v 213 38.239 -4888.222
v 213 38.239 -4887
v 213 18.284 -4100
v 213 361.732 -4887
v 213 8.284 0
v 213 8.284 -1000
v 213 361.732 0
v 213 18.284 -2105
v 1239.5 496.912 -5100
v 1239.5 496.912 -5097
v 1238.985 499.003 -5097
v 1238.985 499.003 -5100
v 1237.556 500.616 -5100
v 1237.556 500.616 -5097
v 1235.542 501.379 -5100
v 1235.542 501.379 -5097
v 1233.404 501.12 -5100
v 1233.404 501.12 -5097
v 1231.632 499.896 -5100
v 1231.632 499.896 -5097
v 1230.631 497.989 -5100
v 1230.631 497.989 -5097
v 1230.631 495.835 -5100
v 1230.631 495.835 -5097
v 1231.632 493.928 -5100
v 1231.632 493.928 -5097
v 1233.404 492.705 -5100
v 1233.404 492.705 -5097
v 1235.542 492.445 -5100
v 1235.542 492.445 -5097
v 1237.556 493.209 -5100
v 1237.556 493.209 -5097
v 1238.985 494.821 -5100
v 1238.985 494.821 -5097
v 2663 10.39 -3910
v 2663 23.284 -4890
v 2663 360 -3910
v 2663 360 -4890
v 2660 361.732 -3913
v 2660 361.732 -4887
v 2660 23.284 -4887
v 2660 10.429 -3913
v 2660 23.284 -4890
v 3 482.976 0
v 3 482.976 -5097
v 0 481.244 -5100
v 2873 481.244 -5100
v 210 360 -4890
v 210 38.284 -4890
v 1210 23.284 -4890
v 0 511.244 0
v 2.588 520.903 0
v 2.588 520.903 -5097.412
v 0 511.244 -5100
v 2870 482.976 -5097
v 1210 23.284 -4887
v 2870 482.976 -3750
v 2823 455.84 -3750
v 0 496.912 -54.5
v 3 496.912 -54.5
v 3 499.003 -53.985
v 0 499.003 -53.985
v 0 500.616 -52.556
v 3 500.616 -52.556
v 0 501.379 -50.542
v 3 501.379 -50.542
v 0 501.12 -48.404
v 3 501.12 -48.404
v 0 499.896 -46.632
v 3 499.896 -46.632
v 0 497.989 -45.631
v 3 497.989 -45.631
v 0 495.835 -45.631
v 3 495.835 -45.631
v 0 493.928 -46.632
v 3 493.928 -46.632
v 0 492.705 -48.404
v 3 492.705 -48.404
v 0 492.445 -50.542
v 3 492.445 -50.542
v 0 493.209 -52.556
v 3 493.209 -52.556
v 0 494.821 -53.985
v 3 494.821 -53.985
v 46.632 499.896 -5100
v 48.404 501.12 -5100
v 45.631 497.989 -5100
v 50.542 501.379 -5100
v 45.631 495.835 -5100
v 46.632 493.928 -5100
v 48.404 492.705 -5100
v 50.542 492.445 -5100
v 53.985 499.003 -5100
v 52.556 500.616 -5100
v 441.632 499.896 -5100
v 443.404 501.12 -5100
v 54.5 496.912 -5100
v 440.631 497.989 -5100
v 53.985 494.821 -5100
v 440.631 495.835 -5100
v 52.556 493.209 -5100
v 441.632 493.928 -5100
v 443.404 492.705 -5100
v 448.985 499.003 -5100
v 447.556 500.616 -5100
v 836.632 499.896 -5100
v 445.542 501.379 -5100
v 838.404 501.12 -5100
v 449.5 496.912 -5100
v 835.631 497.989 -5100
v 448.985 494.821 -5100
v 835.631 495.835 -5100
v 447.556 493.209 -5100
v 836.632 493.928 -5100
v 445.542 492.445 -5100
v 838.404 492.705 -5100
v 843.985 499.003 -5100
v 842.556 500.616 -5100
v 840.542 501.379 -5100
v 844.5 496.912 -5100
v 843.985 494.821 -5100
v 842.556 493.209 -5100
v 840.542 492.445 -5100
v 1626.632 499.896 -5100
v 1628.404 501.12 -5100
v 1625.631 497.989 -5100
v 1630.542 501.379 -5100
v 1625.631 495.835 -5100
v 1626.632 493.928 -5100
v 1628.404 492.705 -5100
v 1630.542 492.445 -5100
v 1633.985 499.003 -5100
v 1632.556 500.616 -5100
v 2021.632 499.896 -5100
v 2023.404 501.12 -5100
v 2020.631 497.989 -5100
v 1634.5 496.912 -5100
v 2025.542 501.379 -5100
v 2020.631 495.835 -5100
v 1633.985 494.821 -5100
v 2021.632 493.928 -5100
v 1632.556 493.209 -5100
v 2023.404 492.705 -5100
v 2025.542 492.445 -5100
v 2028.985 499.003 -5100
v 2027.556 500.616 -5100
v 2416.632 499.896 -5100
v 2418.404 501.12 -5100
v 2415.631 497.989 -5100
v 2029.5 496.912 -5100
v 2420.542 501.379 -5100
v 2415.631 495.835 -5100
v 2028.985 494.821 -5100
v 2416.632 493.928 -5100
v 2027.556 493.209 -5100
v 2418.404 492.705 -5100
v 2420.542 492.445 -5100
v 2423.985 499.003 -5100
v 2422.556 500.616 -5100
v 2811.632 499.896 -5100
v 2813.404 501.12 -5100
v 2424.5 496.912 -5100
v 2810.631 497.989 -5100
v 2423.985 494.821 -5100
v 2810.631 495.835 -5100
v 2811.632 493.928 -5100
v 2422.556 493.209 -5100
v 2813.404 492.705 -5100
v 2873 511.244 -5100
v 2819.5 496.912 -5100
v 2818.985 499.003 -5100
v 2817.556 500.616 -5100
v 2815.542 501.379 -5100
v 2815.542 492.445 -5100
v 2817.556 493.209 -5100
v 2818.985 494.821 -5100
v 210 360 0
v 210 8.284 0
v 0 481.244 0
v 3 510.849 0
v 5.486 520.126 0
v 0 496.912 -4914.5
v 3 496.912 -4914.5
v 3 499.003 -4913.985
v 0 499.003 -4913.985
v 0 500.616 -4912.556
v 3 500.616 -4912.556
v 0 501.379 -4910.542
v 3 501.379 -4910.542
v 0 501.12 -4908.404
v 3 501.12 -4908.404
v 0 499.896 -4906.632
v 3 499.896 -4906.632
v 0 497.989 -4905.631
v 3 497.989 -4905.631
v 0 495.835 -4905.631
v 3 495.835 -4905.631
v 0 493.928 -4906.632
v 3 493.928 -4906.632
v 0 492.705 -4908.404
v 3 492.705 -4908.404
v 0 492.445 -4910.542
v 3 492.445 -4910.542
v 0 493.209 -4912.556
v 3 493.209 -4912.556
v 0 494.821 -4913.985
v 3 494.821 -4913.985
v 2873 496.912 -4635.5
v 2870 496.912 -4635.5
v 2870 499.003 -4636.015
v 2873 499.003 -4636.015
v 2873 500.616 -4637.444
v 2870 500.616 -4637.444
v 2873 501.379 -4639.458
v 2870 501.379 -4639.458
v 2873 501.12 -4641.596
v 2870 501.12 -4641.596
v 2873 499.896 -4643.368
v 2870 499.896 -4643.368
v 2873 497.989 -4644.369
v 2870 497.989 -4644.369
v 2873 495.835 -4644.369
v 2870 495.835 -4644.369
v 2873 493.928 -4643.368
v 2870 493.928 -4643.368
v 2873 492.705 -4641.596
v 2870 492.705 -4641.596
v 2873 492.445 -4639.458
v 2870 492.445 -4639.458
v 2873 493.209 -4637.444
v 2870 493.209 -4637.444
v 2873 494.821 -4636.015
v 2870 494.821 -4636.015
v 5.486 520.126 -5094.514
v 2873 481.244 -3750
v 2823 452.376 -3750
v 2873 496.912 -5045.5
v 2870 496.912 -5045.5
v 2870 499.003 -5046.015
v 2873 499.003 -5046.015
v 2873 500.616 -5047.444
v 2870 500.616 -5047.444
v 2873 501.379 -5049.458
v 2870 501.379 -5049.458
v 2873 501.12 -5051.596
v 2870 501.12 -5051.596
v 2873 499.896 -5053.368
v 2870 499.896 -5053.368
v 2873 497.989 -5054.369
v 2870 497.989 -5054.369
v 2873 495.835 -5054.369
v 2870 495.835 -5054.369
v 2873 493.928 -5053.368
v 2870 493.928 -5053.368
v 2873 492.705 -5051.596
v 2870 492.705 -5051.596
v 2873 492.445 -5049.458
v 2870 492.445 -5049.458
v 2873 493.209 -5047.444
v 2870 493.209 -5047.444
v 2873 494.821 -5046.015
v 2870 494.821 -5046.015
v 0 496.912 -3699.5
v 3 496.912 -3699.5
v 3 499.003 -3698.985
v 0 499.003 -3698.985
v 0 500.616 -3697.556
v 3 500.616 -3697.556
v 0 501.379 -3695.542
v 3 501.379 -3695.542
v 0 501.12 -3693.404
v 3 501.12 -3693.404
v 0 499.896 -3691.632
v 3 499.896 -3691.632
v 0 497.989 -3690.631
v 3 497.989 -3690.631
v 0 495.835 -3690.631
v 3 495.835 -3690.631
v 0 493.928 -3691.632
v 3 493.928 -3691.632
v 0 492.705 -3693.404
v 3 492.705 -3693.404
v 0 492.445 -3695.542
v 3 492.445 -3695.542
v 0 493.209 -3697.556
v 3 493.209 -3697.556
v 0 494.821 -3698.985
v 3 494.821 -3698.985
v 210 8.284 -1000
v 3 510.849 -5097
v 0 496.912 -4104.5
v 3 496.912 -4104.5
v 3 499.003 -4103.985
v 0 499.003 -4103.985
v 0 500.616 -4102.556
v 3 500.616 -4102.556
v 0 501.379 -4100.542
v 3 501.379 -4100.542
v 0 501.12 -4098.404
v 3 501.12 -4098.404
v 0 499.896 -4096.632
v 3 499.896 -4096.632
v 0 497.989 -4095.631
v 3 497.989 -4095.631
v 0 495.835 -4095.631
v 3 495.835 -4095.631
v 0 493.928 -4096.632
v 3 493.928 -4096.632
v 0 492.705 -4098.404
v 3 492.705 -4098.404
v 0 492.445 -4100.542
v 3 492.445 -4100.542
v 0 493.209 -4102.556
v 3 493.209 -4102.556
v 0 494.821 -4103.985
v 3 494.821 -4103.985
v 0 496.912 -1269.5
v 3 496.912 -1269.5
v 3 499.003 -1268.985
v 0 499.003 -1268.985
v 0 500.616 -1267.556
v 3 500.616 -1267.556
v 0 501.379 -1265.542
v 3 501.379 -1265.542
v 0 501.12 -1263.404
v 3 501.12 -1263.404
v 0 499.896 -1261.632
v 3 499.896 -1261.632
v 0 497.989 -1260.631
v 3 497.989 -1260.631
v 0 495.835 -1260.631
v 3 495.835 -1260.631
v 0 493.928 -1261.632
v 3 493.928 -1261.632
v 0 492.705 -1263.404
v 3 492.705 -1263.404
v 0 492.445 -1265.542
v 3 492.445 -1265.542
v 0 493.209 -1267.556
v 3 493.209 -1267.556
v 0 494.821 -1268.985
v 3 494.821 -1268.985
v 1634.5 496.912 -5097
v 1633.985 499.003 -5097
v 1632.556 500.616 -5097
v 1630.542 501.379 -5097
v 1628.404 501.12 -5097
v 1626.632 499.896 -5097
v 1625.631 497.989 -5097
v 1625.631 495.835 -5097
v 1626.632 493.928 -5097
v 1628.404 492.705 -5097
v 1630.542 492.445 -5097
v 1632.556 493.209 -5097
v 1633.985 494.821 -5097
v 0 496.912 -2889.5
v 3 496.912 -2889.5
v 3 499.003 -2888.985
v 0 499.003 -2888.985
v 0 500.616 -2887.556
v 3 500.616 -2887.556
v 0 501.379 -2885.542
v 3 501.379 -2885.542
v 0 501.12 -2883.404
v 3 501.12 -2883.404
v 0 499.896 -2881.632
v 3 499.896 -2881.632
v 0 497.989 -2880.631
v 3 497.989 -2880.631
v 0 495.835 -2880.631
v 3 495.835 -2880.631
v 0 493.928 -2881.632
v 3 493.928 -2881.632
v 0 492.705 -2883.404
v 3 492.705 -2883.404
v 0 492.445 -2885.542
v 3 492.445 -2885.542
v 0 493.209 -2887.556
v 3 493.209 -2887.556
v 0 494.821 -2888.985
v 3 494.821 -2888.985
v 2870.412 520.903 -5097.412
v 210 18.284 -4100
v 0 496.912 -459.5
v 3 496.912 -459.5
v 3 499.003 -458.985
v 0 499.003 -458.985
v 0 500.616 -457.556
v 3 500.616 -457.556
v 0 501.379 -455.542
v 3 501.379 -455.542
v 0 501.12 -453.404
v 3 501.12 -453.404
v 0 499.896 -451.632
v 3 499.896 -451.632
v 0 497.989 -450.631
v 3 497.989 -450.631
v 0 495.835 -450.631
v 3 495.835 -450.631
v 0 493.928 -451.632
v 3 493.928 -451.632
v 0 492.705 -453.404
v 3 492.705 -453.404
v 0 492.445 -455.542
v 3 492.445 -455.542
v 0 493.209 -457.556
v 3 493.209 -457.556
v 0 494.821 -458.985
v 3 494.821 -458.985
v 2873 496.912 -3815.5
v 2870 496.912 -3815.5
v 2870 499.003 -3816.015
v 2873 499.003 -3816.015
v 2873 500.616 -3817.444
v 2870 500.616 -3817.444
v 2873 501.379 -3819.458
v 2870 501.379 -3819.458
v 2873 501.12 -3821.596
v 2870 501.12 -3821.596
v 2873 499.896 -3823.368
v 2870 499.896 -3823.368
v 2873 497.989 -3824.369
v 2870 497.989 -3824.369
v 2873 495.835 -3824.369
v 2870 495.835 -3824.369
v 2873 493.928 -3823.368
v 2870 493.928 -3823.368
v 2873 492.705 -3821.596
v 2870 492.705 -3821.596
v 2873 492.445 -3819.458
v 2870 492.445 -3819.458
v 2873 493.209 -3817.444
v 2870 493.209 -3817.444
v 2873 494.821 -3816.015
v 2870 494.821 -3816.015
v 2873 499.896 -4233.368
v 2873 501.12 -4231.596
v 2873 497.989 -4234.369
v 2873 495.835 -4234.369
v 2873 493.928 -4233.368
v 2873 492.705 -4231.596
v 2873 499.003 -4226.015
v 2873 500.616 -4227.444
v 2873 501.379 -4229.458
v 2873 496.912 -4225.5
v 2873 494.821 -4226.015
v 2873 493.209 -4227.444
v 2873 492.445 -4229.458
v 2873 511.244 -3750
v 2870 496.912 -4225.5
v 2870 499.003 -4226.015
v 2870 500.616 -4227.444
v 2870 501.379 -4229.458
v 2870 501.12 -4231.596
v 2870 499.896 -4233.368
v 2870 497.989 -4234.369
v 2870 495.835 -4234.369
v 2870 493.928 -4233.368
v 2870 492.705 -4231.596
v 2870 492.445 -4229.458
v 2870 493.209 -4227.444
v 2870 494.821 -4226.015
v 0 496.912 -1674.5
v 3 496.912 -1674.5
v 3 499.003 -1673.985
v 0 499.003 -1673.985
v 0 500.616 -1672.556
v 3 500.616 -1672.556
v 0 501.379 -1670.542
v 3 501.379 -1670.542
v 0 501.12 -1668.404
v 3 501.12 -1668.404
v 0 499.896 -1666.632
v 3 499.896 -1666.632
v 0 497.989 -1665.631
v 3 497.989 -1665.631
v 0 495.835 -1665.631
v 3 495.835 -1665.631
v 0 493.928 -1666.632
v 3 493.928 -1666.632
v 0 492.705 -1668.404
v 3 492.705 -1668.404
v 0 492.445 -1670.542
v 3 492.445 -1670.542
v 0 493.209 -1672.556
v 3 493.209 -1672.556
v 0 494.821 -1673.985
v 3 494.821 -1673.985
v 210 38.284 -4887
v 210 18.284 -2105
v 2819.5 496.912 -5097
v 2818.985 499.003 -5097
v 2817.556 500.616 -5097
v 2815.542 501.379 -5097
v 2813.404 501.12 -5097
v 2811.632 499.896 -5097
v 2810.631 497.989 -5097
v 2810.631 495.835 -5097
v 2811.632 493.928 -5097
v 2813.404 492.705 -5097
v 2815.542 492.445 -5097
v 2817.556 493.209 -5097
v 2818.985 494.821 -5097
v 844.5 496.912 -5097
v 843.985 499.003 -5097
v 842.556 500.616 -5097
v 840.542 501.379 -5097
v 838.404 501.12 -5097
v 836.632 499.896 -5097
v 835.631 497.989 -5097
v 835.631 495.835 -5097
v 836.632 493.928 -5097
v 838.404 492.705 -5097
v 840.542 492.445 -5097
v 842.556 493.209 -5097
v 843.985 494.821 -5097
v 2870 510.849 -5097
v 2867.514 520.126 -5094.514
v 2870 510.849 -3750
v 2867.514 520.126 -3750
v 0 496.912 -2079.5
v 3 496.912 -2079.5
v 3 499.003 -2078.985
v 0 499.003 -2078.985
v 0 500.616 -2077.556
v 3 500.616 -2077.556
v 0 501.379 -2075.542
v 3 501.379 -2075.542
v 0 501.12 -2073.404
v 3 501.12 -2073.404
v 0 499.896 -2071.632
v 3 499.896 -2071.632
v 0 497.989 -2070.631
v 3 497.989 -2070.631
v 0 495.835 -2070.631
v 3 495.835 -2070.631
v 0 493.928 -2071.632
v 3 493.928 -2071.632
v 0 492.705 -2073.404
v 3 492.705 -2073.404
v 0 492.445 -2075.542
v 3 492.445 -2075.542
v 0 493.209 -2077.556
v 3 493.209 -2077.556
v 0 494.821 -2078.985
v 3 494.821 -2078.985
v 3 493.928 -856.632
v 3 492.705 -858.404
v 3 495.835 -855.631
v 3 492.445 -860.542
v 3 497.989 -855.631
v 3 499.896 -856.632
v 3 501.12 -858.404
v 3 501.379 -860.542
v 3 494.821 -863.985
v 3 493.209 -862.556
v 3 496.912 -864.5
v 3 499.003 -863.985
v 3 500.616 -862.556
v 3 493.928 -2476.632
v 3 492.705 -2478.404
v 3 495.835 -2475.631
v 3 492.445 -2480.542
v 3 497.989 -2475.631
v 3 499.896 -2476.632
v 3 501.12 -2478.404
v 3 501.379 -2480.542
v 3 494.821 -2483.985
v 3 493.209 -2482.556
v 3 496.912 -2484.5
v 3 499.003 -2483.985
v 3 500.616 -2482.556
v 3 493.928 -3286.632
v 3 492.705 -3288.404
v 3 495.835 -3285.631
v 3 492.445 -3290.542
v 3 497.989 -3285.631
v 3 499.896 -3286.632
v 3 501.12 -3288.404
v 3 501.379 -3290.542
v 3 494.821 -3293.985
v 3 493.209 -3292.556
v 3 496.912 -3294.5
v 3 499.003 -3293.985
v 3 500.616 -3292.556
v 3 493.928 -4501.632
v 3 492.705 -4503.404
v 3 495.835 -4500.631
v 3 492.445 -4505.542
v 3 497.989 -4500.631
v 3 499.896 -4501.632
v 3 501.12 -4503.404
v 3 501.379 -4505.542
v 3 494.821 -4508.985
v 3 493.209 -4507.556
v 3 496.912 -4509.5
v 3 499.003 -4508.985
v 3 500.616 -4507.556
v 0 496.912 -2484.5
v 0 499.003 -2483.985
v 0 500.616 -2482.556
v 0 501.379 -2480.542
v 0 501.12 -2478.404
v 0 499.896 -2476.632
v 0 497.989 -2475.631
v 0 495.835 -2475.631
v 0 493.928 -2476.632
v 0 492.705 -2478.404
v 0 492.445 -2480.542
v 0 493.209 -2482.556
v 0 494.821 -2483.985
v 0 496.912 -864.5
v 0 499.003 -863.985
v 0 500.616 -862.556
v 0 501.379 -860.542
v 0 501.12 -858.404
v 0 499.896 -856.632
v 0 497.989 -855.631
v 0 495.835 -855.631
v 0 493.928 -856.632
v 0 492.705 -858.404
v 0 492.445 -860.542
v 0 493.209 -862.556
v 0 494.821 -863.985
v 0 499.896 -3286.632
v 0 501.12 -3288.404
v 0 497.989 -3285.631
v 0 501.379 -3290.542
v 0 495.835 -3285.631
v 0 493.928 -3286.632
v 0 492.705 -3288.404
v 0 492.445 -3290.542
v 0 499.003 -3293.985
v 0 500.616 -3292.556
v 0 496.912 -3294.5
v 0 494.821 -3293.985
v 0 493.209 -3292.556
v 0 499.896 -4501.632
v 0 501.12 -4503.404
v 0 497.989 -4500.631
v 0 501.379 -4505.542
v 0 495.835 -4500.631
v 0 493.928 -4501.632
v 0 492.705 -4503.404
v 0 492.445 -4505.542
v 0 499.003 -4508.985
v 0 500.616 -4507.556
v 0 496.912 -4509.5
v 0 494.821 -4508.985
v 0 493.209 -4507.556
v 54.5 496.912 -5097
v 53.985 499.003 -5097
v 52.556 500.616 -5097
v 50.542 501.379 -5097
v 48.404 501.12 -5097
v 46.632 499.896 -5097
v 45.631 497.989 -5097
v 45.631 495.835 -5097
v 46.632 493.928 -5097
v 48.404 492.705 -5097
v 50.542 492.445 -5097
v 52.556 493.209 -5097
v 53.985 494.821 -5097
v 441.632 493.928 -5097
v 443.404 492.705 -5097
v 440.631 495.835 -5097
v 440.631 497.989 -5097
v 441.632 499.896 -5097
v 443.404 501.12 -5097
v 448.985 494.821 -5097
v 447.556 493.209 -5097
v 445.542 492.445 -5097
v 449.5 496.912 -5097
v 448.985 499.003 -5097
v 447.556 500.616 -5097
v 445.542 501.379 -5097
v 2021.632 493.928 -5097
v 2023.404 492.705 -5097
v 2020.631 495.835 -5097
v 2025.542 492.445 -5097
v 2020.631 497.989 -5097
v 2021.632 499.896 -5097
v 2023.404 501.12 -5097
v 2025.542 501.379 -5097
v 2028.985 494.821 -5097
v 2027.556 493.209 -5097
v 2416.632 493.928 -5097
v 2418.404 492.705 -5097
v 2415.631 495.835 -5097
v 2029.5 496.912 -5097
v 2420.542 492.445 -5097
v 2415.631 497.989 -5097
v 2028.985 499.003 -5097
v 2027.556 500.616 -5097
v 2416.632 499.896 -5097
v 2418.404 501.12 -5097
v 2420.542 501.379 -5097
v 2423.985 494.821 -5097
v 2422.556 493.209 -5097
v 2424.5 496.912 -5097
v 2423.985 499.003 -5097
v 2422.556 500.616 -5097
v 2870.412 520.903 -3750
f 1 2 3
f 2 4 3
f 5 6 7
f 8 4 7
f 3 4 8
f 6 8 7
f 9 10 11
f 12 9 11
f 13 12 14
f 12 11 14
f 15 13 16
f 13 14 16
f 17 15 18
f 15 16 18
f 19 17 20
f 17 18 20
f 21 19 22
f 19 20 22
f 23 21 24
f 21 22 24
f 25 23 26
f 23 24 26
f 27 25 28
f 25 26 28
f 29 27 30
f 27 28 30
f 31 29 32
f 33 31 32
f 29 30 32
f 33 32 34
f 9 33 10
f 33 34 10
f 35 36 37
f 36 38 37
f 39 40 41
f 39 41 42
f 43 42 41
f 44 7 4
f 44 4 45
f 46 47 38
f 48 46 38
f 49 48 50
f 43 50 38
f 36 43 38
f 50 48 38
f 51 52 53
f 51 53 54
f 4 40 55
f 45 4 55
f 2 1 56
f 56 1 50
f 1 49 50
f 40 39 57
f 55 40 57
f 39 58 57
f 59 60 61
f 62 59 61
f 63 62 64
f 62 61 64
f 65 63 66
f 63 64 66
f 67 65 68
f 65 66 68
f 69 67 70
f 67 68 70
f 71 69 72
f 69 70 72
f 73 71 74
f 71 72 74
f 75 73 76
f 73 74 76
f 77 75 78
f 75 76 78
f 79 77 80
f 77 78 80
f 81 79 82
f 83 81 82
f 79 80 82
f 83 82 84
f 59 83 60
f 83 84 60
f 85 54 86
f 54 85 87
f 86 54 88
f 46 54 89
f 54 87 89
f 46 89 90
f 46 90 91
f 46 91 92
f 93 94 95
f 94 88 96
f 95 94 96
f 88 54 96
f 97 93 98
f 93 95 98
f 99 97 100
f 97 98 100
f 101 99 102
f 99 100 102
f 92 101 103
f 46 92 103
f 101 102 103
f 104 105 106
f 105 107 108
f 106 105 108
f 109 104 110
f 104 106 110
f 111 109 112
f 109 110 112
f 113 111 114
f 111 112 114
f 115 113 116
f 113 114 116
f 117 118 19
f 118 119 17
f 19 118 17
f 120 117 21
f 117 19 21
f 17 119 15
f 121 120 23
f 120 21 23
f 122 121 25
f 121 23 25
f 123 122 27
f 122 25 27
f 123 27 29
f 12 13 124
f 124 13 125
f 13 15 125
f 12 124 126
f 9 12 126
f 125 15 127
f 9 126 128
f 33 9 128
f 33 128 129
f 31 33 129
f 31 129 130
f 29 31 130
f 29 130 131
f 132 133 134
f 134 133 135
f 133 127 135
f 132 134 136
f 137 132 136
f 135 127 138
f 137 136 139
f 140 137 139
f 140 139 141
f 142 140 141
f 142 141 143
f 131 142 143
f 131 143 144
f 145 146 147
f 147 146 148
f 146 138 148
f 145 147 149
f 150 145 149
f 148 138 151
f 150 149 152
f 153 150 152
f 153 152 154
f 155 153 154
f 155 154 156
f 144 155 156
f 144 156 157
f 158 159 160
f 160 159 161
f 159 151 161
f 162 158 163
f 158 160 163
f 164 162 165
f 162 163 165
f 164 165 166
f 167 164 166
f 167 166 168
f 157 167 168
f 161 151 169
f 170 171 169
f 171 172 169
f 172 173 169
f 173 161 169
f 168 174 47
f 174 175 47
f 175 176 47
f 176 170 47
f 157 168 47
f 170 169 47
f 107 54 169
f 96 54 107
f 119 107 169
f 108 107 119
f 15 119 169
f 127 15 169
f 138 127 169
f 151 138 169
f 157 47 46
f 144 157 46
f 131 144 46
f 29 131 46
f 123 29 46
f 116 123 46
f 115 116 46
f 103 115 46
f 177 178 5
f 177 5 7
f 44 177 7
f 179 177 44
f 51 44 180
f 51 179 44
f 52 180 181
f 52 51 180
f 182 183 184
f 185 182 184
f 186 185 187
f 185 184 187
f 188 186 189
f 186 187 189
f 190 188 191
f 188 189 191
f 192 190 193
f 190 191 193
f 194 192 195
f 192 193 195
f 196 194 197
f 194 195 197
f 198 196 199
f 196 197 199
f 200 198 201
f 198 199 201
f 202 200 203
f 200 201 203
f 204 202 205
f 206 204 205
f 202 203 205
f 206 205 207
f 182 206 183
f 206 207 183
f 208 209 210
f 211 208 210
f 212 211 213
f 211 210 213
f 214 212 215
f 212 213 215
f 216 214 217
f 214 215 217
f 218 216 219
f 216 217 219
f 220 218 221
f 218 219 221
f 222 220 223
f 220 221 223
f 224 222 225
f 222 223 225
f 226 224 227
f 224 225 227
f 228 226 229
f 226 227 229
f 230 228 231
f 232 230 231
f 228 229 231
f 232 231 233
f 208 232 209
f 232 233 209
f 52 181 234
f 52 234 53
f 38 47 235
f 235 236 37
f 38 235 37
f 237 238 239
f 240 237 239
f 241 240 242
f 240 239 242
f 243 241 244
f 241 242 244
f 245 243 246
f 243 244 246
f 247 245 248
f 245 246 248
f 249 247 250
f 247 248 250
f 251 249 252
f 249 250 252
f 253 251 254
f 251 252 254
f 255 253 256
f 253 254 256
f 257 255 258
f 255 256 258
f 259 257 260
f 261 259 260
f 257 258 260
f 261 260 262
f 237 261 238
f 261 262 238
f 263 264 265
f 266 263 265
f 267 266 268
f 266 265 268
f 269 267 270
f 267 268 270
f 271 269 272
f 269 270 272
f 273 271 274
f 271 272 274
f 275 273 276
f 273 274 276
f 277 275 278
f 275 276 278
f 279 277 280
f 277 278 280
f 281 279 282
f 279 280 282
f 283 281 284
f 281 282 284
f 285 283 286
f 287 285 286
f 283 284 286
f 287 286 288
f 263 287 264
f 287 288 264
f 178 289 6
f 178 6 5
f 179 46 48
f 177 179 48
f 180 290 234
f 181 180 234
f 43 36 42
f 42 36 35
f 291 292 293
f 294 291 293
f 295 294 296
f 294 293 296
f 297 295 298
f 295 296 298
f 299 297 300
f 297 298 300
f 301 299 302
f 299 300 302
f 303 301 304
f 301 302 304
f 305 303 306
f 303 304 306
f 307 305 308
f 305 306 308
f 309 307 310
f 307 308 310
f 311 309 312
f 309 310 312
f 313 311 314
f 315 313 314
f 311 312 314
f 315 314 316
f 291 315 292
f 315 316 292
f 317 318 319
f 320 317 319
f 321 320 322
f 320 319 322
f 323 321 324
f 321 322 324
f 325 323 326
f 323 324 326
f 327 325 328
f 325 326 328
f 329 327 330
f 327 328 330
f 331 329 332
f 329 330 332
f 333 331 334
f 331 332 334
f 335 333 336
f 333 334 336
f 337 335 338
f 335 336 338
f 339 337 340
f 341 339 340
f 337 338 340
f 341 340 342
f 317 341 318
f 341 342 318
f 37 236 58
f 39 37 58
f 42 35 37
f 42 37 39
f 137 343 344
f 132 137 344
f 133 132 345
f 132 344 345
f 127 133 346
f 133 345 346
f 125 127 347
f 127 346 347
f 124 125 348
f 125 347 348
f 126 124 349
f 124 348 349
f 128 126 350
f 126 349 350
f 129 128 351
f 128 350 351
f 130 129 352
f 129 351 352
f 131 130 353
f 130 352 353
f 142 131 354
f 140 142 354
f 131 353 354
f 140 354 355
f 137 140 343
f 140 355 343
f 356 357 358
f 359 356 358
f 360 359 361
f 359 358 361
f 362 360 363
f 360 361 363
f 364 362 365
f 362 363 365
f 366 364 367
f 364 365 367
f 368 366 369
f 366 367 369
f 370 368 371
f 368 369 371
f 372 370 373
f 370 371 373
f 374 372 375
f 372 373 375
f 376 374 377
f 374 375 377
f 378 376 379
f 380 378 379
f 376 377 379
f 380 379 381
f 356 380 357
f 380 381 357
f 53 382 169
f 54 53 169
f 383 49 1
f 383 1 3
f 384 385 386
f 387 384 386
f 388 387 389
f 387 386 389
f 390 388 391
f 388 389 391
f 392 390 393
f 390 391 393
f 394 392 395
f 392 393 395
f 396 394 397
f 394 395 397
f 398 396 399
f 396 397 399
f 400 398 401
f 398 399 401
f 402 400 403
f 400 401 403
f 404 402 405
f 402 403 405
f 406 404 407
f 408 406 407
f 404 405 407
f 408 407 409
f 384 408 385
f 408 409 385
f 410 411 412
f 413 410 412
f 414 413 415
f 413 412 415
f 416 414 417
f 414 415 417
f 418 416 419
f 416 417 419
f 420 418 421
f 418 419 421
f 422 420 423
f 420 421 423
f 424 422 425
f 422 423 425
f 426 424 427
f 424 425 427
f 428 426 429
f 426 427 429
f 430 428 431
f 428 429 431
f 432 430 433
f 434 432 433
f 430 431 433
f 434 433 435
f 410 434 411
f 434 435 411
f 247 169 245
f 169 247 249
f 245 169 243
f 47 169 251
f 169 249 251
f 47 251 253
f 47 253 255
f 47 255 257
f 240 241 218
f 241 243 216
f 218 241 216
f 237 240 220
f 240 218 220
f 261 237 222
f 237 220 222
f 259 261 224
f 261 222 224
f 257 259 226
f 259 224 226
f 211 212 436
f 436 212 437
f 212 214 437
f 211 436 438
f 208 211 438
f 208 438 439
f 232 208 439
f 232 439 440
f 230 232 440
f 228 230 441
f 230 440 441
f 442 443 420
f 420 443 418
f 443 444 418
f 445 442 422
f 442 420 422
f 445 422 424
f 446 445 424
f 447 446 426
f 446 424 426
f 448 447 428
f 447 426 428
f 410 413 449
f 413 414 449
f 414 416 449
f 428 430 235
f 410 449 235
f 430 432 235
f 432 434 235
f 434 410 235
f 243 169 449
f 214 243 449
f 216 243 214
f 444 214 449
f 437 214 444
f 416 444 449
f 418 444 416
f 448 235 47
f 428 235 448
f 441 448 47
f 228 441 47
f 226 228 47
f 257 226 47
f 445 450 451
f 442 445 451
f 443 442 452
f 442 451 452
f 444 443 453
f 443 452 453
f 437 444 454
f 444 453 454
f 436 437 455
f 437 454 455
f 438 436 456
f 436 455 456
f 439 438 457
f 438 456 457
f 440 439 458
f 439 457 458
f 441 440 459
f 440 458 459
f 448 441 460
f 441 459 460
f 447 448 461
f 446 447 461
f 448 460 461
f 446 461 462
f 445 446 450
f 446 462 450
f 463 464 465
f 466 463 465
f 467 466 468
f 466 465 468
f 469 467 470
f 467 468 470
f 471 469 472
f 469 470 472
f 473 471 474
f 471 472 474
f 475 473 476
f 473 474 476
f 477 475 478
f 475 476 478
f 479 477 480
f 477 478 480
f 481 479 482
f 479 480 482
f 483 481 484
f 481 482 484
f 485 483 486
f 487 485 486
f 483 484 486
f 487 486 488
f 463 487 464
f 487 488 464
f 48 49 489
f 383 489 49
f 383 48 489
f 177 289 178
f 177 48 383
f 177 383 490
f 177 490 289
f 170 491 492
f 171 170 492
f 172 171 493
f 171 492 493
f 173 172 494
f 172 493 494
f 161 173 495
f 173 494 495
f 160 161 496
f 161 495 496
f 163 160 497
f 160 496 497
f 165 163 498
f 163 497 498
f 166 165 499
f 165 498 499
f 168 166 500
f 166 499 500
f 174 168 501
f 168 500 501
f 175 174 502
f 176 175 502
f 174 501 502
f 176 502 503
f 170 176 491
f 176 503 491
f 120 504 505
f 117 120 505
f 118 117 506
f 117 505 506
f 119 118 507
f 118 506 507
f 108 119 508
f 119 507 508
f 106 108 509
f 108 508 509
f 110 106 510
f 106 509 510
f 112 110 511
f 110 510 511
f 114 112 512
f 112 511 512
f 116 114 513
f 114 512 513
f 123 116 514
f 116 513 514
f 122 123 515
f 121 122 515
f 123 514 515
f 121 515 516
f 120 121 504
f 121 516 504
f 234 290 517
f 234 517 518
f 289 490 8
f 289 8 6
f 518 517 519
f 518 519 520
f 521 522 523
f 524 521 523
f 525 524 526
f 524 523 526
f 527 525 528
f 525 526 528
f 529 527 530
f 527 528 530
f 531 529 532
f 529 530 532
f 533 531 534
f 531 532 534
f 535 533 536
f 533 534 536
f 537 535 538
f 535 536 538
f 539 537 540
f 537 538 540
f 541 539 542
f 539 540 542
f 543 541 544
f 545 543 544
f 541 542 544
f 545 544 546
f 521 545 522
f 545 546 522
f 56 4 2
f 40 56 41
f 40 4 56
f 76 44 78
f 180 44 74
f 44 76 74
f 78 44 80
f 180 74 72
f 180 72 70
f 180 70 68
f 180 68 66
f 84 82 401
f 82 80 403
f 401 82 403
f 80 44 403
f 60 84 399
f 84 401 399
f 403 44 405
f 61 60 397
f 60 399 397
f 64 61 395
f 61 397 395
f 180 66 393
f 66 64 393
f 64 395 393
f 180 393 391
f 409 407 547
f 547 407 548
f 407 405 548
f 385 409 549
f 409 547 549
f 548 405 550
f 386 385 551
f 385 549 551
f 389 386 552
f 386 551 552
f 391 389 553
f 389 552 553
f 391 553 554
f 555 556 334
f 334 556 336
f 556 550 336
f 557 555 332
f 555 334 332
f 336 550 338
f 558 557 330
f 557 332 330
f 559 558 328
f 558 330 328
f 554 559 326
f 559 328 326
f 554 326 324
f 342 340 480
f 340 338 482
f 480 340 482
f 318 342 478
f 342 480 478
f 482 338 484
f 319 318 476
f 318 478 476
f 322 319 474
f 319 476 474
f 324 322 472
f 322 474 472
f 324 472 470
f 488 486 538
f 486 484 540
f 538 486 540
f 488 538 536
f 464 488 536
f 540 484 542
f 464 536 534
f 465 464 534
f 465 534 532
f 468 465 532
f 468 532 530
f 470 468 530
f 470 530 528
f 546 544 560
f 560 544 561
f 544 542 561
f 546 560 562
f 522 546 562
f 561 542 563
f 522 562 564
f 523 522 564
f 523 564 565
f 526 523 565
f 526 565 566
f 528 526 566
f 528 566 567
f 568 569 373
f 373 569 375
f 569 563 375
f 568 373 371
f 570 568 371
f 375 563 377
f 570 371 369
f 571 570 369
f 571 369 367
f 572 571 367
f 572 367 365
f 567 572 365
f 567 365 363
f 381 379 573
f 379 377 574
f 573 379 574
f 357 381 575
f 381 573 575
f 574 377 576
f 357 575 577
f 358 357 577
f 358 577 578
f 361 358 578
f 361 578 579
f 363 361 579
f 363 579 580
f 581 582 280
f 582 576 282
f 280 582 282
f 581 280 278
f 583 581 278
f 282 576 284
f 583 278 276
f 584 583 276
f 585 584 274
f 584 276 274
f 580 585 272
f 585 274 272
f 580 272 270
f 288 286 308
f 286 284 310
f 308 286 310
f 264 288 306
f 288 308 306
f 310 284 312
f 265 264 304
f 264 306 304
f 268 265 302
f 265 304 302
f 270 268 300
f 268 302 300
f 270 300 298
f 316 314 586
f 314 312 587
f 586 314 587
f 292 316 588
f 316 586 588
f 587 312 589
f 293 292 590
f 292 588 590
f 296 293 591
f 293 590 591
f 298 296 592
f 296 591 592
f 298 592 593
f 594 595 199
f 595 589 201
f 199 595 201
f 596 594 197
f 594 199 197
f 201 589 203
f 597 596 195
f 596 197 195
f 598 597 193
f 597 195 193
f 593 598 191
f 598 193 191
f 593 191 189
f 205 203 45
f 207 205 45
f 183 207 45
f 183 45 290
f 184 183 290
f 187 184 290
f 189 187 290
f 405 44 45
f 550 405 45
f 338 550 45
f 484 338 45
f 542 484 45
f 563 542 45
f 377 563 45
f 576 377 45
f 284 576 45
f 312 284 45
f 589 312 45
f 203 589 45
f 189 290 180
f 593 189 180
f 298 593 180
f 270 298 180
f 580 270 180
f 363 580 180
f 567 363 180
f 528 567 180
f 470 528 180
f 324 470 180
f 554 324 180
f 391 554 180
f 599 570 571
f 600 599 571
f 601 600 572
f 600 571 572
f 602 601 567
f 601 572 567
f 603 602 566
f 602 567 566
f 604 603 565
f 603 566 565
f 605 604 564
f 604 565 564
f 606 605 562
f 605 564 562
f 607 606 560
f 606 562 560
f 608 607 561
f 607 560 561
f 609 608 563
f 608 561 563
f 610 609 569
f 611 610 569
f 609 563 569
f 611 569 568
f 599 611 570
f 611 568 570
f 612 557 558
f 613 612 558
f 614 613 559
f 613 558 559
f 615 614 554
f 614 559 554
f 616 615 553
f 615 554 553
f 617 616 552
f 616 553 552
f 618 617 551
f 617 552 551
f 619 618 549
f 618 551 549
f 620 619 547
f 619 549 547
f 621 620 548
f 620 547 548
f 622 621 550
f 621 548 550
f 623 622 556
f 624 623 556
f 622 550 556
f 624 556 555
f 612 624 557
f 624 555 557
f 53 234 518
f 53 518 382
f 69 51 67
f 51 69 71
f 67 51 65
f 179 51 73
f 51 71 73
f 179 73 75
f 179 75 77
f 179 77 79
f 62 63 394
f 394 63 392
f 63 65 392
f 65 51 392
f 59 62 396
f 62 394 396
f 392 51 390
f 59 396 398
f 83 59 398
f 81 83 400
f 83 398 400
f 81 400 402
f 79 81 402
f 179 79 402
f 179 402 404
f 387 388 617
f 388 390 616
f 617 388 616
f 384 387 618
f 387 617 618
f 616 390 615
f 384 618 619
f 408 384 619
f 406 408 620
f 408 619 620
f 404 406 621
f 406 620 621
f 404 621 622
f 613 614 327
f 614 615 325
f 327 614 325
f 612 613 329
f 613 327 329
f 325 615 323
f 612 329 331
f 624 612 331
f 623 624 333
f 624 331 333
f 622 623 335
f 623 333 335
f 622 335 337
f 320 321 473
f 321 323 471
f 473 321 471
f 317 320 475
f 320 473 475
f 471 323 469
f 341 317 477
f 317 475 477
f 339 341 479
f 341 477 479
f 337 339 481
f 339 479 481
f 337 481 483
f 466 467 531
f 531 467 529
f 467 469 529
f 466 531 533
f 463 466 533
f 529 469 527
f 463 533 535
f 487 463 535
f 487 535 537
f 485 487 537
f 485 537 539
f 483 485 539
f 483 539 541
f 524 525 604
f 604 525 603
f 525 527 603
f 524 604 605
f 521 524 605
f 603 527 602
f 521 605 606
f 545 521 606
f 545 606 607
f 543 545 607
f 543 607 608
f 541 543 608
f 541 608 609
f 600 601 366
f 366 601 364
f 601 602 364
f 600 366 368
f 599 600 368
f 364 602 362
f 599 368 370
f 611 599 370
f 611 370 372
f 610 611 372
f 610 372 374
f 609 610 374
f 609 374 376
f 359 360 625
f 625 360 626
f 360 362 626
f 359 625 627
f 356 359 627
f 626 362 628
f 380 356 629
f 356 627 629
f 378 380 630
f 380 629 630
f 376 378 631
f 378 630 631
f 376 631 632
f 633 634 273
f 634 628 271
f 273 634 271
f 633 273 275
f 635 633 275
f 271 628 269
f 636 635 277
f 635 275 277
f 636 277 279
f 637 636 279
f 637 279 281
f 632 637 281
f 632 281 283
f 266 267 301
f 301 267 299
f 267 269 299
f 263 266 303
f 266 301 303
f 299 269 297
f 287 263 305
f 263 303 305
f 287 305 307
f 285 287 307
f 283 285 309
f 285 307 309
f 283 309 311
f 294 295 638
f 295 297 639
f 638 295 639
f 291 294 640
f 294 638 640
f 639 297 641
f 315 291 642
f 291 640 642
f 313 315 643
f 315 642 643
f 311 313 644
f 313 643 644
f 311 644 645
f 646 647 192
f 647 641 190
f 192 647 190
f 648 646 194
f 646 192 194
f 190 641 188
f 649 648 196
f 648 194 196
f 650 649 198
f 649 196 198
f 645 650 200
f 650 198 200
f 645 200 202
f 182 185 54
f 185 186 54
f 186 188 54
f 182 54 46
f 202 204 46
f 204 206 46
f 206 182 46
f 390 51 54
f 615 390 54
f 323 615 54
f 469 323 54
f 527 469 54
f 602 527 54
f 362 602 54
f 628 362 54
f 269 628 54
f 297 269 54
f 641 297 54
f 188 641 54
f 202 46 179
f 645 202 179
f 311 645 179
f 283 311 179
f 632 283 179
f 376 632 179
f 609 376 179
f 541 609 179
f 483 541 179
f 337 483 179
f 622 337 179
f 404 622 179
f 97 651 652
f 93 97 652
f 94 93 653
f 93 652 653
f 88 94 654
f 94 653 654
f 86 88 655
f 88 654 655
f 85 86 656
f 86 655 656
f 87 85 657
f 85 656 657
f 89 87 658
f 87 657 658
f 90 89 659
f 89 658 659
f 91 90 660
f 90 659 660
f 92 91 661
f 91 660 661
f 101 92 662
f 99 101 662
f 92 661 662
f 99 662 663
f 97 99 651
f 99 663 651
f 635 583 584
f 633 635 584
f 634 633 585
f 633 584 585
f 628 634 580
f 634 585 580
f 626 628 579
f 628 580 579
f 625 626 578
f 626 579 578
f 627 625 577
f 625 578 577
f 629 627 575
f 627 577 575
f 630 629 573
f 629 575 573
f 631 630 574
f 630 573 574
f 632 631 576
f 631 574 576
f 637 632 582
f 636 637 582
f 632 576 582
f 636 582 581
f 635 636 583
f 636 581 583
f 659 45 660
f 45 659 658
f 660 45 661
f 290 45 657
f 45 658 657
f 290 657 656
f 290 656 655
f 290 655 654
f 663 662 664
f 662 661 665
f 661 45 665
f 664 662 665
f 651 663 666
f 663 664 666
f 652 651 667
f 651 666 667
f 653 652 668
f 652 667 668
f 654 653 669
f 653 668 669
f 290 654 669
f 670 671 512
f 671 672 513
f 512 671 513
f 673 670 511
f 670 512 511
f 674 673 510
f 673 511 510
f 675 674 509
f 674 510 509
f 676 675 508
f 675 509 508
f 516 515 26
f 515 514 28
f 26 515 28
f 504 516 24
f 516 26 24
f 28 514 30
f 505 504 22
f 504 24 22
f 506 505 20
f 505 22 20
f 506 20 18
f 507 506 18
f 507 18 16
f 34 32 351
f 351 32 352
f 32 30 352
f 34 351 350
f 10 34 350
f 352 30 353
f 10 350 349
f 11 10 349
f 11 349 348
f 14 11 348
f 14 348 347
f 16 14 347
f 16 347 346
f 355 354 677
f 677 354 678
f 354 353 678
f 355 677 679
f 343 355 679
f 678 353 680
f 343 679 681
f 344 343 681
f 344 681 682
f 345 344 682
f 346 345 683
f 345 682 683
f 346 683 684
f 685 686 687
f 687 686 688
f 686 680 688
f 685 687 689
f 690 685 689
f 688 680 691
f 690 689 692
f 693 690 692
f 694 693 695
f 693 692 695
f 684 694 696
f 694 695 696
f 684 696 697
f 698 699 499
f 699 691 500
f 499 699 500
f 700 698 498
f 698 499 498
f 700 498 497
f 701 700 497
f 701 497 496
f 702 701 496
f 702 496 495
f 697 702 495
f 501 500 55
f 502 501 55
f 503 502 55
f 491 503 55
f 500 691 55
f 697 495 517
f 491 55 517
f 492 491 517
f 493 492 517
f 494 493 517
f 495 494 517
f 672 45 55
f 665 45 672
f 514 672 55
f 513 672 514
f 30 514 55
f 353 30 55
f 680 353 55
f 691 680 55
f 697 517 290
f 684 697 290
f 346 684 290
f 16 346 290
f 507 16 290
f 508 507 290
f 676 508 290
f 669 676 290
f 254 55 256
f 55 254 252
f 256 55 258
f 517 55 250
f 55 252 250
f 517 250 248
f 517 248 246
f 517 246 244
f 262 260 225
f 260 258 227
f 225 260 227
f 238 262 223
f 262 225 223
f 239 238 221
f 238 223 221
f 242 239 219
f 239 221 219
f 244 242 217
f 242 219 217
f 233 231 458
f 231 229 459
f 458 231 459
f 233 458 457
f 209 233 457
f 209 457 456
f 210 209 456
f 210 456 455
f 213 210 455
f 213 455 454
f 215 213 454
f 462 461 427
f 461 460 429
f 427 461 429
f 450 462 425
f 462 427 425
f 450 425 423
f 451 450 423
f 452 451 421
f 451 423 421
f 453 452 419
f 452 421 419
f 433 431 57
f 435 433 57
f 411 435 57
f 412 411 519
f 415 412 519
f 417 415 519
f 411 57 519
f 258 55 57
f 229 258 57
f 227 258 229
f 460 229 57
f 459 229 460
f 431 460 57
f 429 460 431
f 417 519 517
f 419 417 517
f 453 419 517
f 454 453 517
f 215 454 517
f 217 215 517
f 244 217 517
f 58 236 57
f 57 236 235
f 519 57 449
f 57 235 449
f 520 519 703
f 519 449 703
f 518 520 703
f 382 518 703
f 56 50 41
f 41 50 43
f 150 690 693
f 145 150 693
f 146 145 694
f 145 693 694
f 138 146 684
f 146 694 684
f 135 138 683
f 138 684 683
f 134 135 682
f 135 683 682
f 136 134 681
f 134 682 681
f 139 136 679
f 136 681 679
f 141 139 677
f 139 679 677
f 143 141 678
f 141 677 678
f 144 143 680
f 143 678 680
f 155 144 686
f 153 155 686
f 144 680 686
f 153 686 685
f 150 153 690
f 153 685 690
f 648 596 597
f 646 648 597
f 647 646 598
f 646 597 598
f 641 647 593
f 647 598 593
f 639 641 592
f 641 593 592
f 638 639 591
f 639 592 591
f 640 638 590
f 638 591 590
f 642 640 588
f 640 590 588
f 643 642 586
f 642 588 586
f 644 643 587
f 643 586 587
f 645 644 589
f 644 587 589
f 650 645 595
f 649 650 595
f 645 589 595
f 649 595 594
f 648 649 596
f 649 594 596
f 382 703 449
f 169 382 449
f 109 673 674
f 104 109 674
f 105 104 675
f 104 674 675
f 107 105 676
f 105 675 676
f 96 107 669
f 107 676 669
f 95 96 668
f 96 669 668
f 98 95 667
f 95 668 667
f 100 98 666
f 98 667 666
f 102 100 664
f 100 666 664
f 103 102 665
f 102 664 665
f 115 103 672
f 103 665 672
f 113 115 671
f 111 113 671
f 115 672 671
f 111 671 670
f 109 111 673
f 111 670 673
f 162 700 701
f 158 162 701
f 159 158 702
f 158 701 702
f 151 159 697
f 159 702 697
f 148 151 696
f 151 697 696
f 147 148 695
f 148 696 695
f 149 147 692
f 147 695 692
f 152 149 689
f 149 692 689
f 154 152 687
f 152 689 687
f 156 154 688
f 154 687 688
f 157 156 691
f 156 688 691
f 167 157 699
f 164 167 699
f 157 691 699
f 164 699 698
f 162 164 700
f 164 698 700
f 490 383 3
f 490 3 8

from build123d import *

# Parameters (mm, degrees)
AUFSATZ_LINEAR_AUSTRAGEN1_DEPTH      = 3
AUFSATZ_LINEAR_AUSTRAGEN2_DEPTH      = 3
AUFSATZ_LINEAR_AUSTRAGEN3_DEPTH      = 3
SCHNITT_LINEAR_AUSTRAGEN1_DEPTH      = 521.902814793
SCHNITT_LINEAR_AUSTRAGEN1_DEPTH_BACK = 1
SKIZZE14_R                           = 4.5
SCHNITT_LINEAR_AUSTRAGEN5_DEPTH      = 10
LINEARES_MUSTER1_COUNT               = 13
LINEARES_MUSTER1_PITCH               = 405
SKIZZE15_R                           = 4.5
SCHNITT_LINEAR_AUSTRAGEN6_DEPTH      = 10
LINEARES_MUSTER2_COUNT               = 13
LINEARES_MUSTER2_PITCH               = 395
SKIZZE16_R                           = 4.5
SCHNITT_LINEAR_AUSTRAGEN7_DEPTH      = 10
LINEARES_MUSTER3_COUNT               = 4
LINEARES_MUSTER3_PITCH               = 410


with BuildPart() as part:
    # Austragung1: sweep along a path in Skizze2
    with BuildLine(Plane(origin=(0, 0, 0), x_dir=(1, 0, 0), z_dir=(0, 1, 0))) as austragung1_path:
        Line((0, 0), (0, 5100))
        Line((0, 5100), (2873, 5100))
        Line((2873, 5100), (2873, 3750))
    # Skizze1 → Austragung1 (sweep)
    with BuildSketch(Plane.XY):
        Polygon((0, 511.24355653), (0, 481.24355653), (210, 360), (210, 38.284271247), (213, 38.284271247), (213, 361.732050808), (3, 482.975607337), (3, 510.848599037), (5.48596793, 520.126357657), (2.588190451, 520.902814793), align=None)
    sweep(path=austragung1_path.line, transition=Transition.RIGHT)

    # Skizze4 → Aufsatz-Linear austragen1 (add)
    with BuildSketch(Plane.ZY.offset(-210)):
        Polygon((-4890, 38.284271247), (-4100, 18.284271247), (-2105, 18.284271247), (-1000, 8.284271247), (0, 8.284271247), (0, 38.284271247), align=None)
    extrude(amount=-AUFSATZ_LINEAR_AUSTRAGEN1_DEPTH)

    # Skizze6 → Aufsatz-Linear austragen2 (add)
    with BuildSketch(Plane(origin=(0, 0, -4890), x_dir=(-1, 0, 0), z_dir=(0, 0, -1))):
        Polygon((-210, 38.284271247), (-1210, 23.284271247), (-2663, 23.284271247), (-2663, 38.284271247), align=None)
    extrude(amount=-AUFSATZ_LINEAR_AUSTRAGEN2_DEPTH)

    # Skizze7 → Aufsatz-Linear austragen3 (add)
    with BuildSketch(Plane(origin=(2663, 0, 0), x_dir=(0, 0, -1), z_dir=(1, 0, 0))):
        Polygon((4890, 23.284271247), (3750, 8.284271247), (3750, 38.284271247), (4890, 38.284271247), align=None)
    extrude(amount=-AUFSATZ_LINEAR_AUSTRAGEN3_DEPTH)

    # Skizze8 → Schnitt-Linear austragen1 (cut, two sides)
    with BuildSketch(Plane(origin=(0, 0, 0), x_dir=(1, 0, 0), z_dir=(0, 1, 0))) as schnitt_linear_austragen1_sk:
        Polygon((2823, 3750), (2637.076527488, 3935.923472512), (2637.076527488, 3750), align=None)
    extrude(amount=SCHNITT_LINEAR_AUSTRAGEN1_DEPTH, mode=Mode.SUBTRACT)
    extrude(schnitt_linear_austragen1_sk.sketch, amount=-SCHNITT_LINEAR_AUSTRAGEN1_DEPTH_BACK, mode=Mode.SUBTRACT)

    # Skizze14 → Schnitt-Linear austragen5 (cut)
    with BuildSketch(Plane(origin=(3, 0, 0), x_dir=(0, 0, -1), z_dir=(1, 0, 0))):
        with Locations((50, 496.912103187)):
            Circle(SKIZZE14_R)
    schnitt_linear_austragen5 = extrude(amount=-SCHNITT_LINEAR_AUSTRAGEN5_DEPTH, mode=Mode.SUBTRACT)

    # Lineares Muster1: Schnitt-Linear austragen5 ×13
    with Locations(*[(0, 0, -i * LINEARES_MUSTER1_PITCH) for i in range(1, LINEARES_MUSTER1_COUNT)]):
        add(schnitt_linear_austragen5, mode=Mode.SUBTRACT)

    # Skizze15 → Schnitt-Linear austragen6 (cut)
    with BuildSketch(Plane.XY.offset(-5097)):
        with Locations((50, 496.912103187)):
            Circle(SKIZZE15_R)
    schnitt_linear_austragen6 = extrude(amount=-SCHNITT_LINEAR_AUSTRAGEN6_DEPTH, mode=Mode.SUBTRACT)

    # Lineares Muster2: Schnitt-Linear austragen6 ×13
    with Locations(*[(i * LINEARES_MUSTER2_PITCH, 0, 0) for i in range(1, LINEARES_MUSTER2_COUNT)]):
        add(schnitt_linear_austragen6, mode=Mode.SUBTRACT)

    # Skizze16 → Schnitt-Linear austragen7 (cut)
    with BuildSketch(Plane.ZY.offset(-2870)):
        with Locations((-5050, 496.912103187)):
            Circle(SKIZZE16_R)
    schnitt_linear_austragen7 = extrude(amount=-SCHNITT_LINEAR_AUSTRAGEN7_DEPTH, mode=Mode.SUBTRACT)

    # Lineares Muster3: Schnitt-Linear austragen7 ×4
    with Locations(*[(0, 0, i * LINEARES_MUSTER3_PITCH) for i in range(1, LINEARES_MUSTER3_COUNT)]):
        add(schnitt_linear_austragen7, mode=Mode.SUBTRACT)


solid = part.part
